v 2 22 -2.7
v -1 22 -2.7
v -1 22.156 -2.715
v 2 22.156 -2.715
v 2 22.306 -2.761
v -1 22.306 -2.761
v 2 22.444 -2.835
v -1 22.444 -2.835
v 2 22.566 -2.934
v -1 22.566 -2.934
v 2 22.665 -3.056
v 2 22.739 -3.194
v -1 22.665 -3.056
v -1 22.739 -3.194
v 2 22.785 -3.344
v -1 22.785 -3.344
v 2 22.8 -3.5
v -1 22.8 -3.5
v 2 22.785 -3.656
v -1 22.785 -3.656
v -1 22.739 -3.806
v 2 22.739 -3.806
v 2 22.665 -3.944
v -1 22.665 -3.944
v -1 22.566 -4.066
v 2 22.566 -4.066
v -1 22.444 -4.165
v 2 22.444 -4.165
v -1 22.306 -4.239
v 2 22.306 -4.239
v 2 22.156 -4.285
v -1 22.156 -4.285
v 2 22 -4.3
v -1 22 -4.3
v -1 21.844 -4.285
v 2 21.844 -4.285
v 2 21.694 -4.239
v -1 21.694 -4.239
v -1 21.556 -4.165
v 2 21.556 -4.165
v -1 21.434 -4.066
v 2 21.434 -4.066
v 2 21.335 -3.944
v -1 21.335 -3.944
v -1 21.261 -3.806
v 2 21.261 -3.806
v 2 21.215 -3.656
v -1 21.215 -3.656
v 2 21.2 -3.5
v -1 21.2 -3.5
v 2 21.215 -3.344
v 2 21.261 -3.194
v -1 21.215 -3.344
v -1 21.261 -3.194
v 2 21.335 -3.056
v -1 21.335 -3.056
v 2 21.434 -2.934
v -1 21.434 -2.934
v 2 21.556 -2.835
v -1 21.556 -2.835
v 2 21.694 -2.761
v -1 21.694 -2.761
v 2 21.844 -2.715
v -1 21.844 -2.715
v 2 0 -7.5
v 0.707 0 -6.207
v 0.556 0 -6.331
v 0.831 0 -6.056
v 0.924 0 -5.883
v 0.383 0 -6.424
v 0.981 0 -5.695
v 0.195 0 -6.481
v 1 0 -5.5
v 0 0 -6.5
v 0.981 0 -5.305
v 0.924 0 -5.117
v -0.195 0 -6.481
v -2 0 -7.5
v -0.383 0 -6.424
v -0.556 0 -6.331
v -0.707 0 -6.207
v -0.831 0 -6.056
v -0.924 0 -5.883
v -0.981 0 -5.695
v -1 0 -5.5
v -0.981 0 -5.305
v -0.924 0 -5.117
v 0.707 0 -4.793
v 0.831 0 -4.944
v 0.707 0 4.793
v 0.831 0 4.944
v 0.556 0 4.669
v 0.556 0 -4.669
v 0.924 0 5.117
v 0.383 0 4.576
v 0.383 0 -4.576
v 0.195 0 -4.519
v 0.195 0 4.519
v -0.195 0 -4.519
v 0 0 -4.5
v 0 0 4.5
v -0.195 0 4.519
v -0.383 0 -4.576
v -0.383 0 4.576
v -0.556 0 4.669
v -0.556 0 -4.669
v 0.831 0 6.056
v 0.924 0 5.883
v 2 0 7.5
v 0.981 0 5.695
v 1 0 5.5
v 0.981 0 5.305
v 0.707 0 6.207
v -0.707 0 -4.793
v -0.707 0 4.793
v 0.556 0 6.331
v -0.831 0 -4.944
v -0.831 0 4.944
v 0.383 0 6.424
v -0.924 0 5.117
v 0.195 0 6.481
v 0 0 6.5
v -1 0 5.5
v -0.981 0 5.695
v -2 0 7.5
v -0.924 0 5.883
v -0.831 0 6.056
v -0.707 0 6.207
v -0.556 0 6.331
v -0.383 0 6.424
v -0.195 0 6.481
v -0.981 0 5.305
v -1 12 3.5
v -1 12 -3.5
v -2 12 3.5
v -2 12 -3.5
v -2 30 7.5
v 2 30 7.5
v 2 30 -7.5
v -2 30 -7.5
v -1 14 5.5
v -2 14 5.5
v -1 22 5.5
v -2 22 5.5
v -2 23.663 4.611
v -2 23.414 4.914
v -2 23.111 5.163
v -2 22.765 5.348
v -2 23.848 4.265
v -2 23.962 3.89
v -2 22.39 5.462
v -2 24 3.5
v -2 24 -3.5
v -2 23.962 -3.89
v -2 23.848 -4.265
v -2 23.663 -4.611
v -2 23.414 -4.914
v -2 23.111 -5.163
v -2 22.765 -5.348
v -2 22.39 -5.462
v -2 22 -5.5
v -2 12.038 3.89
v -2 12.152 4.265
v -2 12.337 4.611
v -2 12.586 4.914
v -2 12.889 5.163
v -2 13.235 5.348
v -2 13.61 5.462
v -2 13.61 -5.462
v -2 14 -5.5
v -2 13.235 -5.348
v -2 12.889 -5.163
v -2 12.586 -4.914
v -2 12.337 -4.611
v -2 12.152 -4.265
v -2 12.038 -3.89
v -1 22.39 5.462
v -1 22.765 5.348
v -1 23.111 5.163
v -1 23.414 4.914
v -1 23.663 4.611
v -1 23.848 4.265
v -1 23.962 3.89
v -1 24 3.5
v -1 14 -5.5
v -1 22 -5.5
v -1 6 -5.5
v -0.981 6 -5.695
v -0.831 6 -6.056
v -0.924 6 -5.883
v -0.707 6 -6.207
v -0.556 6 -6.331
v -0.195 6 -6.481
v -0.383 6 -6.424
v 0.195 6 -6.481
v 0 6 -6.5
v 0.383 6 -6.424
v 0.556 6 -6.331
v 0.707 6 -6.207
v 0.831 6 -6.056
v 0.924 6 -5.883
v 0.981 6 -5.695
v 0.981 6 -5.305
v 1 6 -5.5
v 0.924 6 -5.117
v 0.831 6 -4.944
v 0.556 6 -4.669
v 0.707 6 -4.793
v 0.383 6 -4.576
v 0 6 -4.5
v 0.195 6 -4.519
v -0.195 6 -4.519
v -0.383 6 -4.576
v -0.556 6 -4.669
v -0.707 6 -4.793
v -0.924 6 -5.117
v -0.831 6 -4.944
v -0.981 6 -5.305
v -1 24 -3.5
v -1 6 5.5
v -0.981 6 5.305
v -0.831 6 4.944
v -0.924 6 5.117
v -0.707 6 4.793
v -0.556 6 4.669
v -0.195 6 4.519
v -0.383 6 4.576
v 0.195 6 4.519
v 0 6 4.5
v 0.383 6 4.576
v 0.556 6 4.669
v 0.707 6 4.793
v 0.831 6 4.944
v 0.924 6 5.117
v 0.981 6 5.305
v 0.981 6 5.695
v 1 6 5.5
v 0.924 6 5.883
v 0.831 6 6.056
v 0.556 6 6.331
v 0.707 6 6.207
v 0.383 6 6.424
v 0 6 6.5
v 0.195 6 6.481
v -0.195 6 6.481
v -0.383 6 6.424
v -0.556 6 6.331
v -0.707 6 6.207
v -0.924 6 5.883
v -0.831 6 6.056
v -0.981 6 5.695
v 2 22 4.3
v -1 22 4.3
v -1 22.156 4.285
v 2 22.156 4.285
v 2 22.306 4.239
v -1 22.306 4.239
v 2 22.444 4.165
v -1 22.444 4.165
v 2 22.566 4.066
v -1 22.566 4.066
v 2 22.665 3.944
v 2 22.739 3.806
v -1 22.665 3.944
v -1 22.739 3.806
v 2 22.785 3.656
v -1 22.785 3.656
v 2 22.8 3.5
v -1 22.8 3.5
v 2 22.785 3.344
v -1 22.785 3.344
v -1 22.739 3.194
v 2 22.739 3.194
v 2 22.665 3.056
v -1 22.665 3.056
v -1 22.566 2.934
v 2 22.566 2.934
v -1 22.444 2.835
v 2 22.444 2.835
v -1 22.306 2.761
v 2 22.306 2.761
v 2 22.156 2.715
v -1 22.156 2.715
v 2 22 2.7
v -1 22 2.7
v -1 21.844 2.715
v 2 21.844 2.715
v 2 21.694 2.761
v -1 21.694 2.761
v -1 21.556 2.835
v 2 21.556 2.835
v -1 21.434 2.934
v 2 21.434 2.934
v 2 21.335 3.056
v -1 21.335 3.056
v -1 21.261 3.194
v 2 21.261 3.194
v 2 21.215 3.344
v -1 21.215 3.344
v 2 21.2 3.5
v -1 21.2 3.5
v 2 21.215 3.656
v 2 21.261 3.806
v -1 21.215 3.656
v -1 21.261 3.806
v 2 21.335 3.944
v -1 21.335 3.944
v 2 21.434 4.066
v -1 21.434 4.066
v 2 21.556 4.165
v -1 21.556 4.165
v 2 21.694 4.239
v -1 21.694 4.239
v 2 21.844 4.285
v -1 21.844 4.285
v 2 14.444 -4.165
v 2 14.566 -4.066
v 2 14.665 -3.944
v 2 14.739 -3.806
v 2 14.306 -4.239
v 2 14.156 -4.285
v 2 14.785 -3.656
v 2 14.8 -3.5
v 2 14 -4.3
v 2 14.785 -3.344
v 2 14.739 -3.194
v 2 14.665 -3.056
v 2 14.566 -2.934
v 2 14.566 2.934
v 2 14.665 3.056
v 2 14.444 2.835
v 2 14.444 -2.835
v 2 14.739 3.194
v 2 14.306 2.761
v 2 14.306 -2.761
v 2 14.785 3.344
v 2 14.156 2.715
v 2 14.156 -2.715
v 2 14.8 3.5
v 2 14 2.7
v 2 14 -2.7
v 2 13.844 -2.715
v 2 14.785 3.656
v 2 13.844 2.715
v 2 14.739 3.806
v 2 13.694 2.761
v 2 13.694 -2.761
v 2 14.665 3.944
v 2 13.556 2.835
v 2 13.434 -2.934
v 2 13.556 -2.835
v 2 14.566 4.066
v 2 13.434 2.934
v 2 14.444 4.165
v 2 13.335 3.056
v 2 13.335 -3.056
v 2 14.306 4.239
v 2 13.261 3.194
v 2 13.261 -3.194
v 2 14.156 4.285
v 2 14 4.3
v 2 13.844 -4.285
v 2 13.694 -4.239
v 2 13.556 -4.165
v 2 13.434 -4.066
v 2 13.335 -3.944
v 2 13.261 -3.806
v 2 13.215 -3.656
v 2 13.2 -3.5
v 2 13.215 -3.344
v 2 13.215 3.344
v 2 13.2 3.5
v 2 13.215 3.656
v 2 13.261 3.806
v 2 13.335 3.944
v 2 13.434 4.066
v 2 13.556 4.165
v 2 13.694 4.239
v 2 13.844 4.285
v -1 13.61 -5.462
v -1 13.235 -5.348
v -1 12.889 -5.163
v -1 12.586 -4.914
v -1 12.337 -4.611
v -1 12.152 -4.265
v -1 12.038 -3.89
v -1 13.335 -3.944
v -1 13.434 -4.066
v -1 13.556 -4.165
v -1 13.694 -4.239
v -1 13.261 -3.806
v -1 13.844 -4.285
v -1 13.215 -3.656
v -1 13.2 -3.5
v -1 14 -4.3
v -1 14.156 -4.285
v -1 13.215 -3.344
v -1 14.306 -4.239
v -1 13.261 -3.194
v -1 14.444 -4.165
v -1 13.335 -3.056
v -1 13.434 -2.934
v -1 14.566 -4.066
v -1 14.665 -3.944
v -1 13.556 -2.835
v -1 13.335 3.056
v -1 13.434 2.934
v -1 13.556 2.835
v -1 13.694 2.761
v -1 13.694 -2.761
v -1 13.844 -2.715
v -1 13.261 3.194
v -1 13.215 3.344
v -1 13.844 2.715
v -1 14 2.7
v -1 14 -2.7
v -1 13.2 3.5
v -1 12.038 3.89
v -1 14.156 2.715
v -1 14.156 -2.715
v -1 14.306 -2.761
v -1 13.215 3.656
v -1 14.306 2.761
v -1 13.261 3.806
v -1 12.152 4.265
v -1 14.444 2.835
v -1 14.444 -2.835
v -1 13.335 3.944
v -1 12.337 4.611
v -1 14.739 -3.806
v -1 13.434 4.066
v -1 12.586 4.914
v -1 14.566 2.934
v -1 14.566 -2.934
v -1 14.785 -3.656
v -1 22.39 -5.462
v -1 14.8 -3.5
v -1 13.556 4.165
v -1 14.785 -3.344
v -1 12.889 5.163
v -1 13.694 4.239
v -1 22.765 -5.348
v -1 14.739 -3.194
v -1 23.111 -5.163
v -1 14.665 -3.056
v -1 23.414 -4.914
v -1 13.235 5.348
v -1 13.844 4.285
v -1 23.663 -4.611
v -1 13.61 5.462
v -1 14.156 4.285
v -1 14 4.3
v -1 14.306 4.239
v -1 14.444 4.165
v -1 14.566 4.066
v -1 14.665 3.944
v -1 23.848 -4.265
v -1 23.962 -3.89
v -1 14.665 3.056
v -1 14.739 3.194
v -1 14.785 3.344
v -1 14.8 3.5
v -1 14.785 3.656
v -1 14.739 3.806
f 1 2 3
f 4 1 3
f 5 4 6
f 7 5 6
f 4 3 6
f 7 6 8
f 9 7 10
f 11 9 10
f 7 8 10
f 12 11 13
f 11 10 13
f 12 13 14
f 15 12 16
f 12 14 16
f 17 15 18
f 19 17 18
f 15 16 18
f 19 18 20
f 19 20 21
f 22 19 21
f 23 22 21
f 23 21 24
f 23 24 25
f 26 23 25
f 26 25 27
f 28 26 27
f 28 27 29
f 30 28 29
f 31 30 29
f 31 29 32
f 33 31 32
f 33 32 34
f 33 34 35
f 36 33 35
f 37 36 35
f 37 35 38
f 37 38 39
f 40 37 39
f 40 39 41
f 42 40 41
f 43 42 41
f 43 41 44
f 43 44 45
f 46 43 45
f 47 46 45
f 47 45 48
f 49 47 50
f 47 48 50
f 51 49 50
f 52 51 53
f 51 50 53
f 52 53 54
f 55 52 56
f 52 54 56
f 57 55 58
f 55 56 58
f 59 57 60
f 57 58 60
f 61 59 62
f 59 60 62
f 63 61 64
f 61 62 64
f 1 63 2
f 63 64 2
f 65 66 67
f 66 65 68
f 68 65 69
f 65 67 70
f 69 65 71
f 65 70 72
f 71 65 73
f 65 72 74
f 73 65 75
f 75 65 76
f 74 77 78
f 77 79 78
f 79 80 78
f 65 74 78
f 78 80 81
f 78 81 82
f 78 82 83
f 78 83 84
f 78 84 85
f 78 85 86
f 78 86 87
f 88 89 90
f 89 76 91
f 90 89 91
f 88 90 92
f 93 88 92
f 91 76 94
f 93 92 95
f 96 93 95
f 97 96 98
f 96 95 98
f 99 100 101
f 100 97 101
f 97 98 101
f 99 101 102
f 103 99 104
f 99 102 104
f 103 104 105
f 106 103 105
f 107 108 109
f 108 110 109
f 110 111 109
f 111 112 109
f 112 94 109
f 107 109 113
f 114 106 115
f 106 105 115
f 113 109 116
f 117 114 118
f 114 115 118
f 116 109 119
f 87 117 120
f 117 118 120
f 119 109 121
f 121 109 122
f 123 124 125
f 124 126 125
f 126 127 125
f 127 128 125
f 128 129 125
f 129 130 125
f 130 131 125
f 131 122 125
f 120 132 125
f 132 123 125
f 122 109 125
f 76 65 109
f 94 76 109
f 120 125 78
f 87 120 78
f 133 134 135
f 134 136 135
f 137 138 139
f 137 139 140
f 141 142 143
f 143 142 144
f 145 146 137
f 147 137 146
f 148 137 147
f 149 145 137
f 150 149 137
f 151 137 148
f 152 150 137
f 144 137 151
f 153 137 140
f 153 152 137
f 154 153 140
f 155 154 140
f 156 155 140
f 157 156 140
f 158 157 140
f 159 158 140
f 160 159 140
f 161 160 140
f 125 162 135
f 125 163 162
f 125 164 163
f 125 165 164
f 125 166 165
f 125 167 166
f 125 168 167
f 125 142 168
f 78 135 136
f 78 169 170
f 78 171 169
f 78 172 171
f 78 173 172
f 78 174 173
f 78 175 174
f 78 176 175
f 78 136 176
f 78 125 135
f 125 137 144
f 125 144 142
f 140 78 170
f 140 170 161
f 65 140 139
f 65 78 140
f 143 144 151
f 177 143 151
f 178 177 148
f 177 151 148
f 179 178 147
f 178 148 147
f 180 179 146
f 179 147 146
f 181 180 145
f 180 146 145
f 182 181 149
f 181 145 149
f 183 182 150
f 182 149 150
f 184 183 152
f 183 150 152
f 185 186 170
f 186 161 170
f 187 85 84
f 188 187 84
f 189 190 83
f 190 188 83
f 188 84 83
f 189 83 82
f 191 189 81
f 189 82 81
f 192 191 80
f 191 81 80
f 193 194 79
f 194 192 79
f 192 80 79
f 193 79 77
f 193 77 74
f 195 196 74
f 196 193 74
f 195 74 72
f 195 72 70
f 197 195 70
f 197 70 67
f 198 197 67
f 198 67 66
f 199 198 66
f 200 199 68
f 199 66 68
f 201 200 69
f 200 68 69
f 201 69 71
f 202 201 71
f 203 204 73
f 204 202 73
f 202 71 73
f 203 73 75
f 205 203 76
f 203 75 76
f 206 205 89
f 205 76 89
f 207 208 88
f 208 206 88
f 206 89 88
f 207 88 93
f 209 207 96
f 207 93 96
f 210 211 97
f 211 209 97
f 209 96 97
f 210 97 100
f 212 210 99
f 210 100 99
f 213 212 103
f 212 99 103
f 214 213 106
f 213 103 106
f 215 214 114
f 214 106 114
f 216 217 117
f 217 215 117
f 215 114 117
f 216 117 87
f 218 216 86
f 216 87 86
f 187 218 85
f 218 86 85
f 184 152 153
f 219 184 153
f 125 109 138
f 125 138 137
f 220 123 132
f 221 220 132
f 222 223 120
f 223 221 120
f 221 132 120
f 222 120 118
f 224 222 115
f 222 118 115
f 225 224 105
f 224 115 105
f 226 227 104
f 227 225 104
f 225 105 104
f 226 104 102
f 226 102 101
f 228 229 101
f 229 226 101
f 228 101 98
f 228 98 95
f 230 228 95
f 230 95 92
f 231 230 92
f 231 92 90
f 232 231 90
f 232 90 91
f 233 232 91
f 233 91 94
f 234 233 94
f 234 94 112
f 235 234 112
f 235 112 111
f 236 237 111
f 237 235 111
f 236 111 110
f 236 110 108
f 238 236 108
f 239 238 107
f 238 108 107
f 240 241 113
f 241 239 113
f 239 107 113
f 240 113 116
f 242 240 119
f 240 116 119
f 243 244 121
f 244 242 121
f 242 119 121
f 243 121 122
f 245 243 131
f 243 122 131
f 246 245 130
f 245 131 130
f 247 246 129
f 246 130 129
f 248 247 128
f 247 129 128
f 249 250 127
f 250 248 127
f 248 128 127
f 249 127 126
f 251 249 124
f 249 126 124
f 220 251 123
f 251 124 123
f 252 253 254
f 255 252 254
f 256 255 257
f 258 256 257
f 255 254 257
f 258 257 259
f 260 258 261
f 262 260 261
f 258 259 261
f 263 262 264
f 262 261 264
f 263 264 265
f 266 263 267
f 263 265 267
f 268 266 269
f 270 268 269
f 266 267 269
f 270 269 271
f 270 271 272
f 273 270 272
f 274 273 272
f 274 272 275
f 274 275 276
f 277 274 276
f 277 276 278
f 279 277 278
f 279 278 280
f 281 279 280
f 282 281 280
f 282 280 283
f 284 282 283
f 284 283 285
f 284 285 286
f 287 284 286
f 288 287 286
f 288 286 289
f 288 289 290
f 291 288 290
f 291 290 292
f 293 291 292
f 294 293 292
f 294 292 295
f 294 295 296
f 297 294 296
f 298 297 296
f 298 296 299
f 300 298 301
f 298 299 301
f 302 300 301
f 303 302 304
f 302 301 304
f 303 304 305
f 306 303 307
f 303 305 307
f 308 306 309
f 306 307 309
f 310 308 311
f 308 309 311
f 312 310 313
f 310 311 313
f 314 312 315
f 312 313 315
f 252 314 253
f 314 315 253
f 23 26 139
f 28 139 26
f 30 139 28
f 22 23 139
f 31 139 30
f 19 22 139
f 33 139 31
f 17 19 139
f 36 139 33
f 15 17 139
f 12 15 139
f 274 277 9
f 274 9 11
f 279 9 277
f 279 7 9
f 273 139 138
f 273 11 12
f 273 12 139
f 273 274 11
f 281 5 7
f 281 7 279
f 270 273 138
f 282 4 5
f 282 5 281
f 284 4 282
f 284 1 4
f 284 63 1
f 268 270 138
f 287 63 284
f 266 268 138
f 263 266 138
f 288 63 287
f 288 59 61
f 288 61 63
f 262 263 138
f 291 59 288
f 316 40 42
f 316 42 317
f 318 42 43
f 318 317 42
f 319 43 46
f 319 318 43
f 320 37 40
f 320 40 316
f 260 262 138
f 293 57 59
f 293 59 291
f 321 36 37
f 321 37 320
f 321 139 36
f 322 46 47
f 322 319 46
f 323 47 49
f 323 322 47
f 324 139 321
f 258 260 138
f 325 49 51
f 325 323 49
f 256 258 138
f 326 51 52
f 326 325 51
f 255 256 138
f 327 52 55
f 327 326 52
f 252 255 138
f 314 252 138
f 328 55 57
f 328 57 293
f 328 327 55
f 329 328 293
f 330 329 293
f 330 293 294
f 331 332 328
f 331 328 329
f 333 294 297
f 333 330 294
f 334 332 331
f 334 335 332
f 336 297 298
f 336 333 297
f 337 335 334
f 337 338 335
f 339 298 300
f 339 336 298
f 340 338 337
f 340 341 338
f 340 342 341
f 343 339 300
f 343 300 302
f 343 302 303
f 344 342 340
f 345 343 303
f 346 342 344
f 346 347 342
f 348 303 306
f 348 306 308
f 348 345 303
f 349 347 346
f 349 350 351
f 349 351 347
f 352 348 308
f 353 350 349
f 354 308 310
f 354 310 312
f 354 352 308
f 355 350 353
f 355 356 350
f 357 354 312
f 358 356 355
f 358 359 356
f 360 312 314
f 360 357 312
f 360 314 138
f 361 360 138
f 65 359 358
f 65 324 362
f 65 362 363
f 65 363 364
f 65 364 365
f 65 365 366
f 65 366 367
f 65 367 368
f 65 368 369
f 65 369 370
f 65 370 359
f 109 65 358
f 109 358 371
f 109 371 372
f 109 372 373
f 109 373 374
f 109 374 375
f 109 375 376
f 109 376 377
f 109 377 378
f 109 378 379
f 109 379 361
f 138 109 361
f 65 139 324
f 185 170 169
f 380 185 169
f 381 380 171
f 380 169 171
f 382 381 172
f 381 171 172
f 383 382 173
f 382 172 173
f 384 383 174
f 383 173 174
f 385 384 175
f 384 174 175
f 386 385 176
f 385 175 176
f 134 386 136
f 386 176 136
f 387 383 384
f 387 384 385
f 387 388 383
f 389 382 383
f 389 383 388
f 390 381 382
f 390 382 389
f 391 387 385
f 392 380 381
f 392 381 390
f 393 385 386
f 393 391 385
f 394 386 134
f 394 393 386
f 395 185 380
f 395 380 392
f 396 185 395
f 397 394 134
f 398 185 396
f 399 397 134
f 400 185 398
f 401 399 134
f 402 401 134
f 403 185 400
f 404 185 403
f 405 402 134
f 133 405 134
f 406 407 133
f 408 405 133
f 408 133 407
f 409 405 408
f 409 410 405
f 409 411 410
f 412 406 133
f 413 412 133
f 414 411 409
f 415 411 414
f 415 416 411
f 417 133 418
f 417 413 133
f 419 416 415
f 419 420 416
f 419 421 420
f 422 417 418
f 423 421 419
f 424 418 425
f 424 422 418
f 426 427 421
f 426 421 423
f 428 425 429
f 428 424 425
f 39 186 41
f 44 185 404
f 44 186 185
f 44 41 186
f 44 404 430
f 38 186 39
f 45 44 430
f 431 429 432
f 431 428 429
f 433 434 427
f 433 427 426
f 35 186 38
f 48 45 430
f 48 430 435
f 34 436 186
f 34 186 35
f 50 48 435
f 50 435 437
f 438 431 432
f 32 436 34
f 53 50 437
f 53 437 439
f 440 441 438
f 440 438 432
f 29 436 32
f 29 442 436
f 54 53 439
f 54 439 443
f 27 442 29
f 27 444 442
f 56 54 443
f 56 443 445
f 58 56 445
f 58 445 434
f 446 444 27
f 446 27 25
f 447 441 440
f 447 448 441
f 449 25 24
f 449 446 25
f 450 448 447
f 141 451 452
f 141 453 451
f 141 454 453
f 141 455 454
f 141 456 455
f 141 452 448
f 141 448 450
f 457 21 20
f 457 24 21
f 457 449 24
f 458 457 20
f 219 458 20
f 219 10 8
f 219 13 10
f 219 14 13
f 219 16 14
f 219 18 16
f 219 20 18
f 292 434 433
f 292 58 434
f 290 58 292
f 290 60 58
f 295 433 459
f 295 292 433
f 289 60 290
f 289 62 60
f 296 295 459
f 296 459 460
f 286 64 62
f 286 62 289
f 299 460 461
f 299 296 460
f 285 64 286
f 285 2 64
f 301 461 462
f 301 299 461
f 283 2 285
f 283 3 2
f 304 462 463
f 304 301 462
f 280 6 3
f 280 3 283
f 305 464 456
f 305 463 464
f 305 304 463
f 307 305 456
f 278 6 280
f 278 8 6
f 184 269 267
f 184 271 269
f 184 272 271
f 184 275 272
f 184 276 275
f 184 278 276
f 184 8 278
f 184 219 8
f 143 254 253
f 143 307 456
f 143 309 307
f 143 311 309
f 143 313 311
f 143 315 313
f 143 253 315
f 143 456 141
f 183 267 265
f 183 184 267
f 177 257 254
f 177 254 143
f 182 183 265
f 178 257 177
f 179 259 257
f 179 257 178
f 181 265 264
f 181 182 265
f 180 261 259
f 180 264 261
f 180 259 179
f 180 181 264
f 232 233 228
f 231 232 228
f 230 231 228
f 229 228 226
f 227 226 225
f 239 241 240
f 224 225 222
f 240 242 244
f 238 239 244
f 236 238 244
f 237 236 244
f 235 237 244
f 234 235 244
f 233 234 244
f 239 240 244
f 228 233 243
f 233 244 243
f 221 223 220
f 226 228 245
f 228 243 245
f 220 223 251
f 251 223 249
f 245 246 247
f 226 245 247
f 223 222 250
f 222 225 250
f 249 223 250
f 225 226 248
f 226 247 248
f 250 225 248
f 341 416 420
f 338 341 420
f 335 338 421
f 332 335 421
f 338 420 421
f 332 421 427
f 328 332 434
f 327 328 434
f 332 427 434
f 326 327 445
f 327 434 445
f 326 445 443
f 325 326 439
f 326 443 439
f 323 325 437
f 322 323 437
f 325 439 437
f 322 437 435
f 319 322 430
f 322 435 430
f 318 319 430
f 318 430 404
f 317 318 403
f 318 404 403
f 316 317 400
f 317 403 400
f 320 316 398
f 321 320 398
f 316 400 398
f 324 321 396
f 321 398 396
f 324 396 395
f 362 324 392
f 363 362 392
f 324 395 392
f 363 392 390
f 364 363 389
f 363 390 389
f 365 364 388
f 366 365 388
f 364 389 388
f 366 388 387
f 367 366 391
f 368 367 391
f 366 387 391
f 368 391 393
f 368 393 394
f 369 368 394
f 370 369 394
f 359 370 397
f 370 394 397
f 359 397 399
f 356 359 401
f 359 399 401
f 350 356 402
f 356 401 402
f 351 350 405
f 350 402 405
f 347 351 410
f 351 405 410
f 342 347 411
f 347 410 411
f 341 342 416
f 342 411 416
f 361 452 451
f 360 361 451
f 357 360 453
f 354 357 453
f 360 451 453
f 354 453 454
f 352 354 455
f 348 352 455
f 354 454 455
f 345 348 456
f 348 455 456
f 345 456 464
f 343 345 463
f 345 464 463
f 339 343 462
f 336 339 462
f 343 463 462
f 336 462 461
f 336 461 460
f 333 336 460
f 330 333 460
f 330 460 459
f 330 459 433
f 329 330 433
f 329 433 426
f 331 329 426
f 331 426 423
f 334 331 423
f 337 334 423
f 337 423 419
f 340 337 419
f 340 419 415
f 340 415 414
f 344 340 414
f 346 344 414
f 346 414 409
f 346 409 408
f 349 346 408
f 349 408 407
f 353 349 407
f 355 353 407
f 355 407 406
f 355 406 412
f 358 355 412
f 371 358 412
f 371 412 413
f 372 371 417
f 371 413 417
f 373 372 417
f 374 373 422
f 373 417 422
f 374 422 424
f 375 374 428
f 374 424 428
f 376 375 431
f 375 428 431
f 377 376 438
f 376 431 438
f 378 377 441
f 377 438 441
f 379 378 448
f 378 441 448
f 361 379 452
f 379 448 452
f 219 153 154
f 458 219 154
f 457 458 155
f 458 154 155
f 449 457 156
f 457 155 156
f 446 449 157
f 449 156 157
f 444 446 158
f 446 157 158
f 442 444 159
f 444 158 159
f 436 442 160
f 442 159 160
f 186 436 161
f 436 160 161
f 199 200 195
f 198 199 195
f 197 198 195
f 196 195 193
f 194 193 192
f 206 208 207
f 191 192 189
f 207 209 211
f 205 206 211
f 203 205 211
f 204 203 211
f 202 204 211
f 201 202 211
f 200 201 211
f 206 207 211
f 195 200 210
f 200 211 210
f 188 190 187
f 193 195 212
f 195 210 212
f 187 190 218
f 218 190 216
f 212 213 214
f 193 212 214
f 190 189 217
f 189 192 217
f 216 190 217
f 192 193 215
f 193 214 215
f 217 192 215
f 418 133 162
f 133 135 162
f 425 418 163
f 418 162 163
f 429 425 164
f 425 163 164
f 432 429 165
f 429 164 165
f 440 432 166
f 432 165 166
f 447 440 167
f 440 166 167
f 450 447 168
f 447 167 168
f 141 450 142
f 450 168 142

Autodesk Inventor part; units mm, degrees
ref_plane "YZ Plane" through (0, 0, 0) normal (1, 0, 0) x (0, 1, 0)
ref_plane "XZ Plane" through (0, 0, 0) normal (0, 1, 0) x (-1, 0, 0)
ref_plane "XY Plane" through (0, 0, 0) normal (0, 0, 1) x (1, 0, 0)
sketch "スケッチ1" plane through (0, 0, 0) normal (0, 1, 0) x (-1, 0, 0)
  line L0 (-2, 7.5) -> (2, 7.5)
  line L1 (2, 7.5) -> (2, -7.5)
  line L2 (2, -7.5) -> (-2, -7.5)
  line L3 (-2, -7.5) -> (-2, 7.5)
  line L4 (-2, 7.5) -> (2, -7.5) construction
  line L5 (2, 7.5) -> (-2, -7.5) construction
  circle A0 centre (0, 5.5) radius 1
  circle A1 centre (0, -5.5) radius 1
  line L6 (0, 5.5) -> (0, 7.5) construction
  line L7 (0, -5.5) -> (0, -7.5) construction
  point P0 (0, 0)
  dimension "d0" = 4
  dimension "d1" = 15
  dimension "d2" = 2
  dimension "d3" = 2
extrude "押し出し1" add sketch "スケッチ1" along normal blind 30 contours L0 L1 L2 L3 | A0 | A1
extrude "押し出し2" cut sketch "スケッチ1" along normal blind 6 contours A0 | A1
sketch "スケッチ2" plane through (-2, 0, -7.5) normal (-1, 0, 0) x (0, 0, 1)
  line L0 (4, 12) -> (11, 12)
  line L1 (13, 14) -> (13, 22)
  line L2 (11, 24) -> (4, 24)
  line L3 (2, 22) -> (2, 14)
  arc A0 (2, 14) -> (4, 12) centre (4, 14) ccw
  arc A1 (4, 24) -> (2, 22) centre (4, 22) ccw
  arc A2 (13, 22) -> (11, 24) centre (11, 22) ccw
  arc A3 (11, 12) -> (13, 14) centre (11, 14) ccw
  line L4 (7.5, 0) -> (7.5, 30) construction
  line L5 (0, 30) -> (15, 30) projected
  circle A4 centre (4, 14) radius 0.8
  circle A5 centre (4, 22) radius 0.8
  circle A6 centre (11, 22) radius 0.8
  circle A7 centre (11, 14) radius 0.8
  point P0 (2, 12)
  point P1 (13, 24)
  point P2 (2, 24)
  dimension "d8" = 12
  dimension "d9" = 11
  dimension "d10" = 2
  dimension "d11" = 6
  dimension "d12" = 1.6
extrude "押し出し3" cut sketch "スケッチ2" against normal blind 1
extrude "押し出し4" cut sketch "スケッチ2" against normal up to surface (4 mm away) contours A4 | A5 | A6 | A7
properties part number "BallSensor_Mount"
